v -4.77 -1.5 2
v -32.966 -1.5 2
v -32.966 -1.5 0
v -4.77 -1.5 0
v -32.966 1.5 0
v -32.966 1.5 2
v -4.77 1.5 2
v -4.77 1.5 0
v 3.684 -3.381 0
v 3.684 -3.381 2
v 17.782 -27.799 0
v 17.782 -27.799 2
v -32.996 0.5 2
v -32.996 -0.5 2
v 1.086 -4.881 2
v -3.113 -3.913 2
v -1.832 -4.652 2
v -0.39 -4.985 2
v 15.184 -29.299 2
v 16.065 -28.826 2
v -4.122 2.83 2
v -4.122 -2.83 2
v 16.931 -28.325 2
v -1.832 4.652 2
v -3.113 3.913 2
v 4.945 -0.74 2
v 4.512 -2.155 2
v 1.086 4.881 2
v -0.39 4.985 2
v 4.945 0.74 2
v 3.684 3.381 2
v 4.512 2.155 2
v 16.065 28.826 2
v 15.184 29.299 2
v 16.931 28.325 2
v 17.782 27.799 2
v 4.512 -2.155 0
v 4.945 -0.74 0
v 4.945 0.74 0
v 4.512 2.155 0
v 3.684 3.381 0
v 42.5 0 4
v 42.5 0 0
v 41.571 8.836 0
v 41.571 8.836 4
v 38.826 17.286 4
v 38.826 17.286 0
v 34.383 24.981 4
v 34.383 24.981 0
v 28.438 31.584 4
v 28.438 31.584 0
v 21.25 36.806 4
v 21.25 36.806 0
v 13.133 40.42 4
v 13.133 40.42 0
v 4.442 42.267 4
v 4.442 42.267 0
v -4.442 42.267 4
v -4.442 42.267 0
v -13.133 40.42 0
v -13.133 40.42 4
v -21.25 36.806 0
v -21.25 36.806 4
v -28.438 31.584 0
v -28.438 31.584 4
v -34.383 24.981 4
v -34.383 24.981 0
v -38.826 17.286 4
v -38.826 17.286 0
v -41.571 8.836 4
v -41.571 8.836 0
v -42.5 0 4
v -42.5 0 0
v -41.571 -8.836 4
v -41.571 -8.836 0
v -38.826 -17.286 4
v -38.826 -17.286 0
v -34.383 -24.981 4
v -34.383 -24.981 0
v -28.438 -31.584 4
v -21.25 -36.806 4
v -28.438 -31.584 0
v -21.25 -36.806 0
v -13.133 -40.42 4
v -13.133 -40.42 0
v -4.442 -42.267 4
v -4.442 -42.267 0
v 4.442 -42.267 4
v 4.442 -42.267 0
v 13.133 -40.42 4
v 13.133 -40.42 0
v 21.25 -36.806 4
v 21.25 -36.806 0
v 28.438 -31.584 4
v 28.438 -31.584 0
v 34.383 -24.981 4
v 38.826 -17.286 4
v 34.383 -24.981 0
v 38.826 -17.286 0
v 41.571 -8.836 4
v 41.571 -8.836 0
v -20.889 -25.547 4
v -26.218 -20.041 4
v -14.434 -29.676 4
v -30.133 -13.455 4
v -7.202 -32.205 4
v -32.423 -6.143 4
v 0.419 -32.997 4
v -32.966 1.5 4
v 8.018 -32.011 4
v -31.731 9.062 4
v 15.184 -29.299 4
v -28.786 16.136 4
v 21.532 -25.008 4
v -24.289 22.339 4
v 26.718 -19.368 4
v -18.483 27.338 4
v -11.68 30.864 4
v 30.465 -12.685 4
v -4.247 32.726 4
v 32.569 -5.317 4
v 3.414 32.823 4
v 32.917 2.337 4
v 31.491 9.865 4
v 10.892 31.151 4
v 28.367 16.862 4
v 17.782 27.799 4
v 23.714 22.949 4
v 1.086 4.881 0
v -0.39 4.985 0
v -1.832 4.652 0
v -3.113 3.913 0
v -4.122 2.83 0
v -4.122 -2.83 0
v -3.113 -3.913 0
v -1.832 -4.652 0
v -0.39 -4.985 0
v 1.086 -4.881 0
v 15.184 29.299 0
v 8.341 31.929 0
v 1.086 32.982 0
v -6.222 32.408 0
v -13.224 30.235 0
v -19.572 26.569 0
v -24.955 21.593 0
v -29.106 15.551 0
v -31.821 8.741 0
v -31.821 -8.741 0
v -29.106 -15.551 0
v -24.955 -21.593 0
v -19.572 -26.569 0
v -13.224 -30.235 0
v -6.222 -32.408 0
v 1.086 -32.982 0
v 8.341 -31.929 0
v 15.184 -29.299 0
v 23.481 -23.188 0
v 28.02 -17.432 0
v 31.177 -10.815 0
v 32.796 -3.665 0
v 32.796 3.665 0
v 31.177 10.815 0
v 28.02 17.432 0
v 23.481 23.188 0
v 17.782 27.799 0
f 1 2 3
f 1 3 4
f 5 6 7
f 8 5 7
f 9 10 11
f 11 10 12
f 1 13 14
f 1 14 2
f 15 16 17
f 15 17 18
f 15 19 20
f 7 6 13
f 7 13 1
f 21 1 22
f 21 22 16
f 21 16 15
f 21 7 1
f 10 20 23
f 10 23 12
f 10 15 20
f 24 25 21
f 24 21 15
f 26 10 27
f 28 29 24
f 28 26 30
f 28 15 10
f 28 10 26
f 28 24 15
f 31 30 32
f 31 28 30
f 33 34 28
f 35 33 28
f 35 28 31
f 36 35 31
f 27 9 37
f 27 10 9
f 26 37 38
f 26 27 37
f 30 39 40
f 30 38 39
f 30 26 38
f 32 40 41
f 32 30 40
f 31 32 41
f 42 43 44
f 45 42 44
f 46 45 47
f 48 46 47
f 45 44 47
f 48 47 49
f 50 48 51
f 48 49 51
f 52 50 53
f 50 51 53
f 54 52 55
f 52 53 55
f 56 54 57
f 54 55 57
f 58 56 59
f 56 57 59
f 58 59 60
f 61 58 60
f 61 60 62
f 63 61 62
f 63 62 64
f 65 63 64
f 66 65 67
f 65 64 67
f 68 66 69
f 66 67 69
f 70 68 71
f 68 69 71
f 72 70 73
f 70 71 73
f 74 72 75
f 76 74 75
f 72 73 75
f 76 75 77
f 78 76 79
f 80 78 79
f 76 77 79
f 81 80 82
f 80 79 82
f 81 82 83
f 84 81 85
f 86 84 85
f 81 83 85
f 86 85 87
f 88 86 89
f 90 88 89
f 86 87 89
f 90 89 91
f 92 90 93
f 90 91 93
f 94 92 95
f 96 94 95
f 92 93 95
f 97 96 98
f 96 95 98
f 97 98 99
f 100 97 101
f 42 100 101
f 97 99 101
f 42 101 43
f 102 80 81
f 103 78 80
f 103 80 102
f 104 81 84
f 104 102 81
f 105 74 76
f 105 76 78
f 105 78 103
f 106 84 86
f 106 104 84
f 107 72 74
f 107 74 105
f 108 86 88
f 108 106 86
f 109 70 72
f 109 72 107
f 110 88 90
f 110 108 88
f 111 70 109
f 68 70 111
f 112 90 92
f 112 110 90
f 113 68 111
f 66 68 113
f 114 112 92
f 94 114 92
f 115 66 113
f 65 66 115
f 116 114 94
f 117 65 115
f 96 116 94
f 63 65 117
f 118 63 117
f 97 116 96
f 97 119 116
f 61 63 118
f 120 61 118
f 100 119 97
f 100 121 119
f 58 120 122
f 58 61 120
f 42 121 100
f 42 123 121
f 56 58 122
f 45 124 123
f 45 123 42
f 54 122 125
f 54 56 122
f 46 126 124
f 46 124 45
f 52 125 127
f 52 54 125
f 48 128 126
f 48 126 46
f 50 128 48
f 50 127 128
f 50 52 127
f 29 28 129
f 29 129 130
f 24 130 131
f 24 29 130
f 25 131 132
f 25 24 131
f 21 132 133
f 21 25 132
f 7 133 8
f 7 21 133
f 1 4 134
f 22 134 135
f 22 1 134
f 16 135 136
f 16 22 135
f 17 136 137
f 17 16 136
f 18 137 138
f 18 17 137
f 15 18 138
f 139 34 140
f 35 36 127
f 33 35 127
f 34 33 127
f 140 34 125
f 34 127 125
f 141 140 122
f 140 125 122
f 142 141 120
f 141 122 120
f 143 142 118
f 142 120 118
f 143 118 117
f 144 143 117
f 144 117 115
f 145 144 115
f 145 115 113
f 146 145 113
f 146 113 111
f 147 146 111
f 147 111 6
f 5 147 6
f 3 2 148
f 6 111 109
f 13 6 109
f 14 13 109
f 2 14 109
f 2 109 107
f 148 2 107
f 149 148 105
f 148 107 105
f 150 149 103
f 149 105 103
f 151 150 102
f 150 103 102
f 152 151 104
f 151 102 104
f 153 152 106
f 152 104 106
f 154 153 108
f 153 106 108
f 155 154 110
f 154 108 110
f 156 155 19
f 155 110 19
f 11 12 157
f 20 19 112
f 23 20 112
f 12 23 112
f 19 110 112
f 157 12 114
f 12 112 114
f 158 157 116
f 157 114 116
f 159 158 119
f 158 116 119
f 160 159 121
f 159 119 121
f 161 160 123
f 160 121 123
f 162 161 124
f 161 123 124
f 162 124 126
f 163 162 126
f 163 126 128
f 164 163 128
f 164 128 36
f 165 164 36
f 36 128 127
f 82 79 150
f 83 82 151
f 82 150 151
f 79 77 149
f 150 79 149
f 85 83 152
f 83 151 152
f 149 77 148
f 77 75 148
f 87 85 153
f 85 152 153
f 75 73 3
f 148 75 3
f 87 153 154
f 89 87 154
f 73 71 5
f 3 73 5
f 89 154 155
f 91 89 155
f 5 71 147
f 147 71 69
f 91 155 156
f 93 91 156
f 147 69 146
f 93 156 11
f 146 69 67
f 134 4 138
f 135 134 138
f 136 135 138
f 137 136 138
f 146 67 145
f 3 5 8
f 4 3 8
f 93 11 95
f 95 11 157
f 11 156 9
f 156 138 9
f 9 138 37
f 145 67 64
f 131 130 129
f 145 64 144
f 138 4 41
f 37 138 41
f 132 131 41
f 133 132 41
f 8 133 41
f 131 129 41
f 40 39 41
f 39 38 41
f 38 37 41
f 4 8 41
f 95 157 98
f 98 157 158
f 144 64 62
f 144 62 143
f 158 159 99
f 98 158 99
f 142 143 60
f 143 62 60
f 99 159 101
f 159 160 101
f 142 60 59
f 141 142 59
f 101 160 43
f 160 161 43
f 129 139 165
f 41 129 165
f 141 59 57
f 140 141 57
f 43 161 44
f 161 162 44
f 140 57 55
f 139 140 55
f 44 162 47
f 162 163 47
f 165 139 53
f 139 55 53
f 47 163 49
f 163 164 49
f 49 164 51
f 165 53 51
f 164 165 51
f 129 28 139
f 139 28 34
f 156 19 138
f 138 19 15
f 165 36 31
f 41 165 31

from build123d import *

# Parameters (mm, degrees)
SKETCH1_R           = 42.5
BOSS_EXTRUDE1_DEPTH = 4
SKETCH3_R           = 33
SKETCH3_R_2         = 5
CUT_EXTRUDE2_DEPTH  = 61.237031799
SKETCH4_W           = 35
SKETCH4_H           = 3
BOSS_EXTRUDE3_DEPTH = 4
SKETCH5_R           = 33
CUT_EXTRUDE4_DEPTH  = 2


# Read off the part's stored shape, not the designer's step: Cavity1
with BuildPart() as part:
    # Sketch1 → Boss-Extrude1 (new body)
    with BuildSketch(Plane.XY):
        Circle(SKETCH1_R)
    extrude(amount=BOSS_EXTRUDE1_DEPTH)

    # Cavity1 outline → Cavity1 (revolve, cut)
    with BuildSketch(Plane.XZ):
        Polygon((0.75, 0), (0.75, 3.9), (0.65, 4), (0, 4), (0, 0), align=None)
    revolve(axis=Axis((0, 0, 0), (0, 0, 1)), mode=Mode.SUBTRACT)

    # Sketch3 → Cut-Extrude2 (cut, through all)
    with BuildSketch(Plane.XY.offset(4)):
        Circle(SKETCH3_R)
        Circle(SKETCH3_R_2, mode=Mode.SUBTRACT)
    extrude(amount=-CUT_EXTRUDE2_DEPTH, mode=Mode.SUBTRACT)


with BuildPart() as cut_extrude2_piece_1:
    # of the separate pieces the step leaves, piece 1, a body of its own (cut_extrude2_pieces)
    add(part.part.solids().sort_by_distance((42.5, 0, 0))[0])



with BuildPart() as cut_extrude2_piece_2:
    # of the separate pieces the step leaves, piece 2, a body of its own (cut_extrude2_pieces)
    add(part.part.solids().sort_by_distance((5, 0, 0))[0])


with BuildPart() as cut_extrude2_piece_1_1:
    add(cut_extrude2_piece_1.part)

    add(cut_extrude2_piece_2.part)  # Boss-Extrude3 merges Cut-Extrude2 piece 2
    # Sketch4 → Boss-Extrude3 (add)
    with BuildSketch(Plane.XY.offset(4)):
        with Locations((-17.5, 0)):
            Rectangle(SKETCH4_W, SKETCH4_H)
        Polygon((-1.299038106, 0.75), (16.200961894, 31.060889132), (18.799038106, 29.560889132), (1.299038106, -0.75), align=None)
        Polygon((1.299038106, 0.75), (18.799038106, -29.560889132), (16.200961894, -31.060889132), (-1.299038106, -0.75), align=None)
    extrude(amount=-BOSS_EXTRUDE3_DEPTH)

    # Sketch5 → Cut-Extrude4 (cut)
    with BuildSketch(Plane.XY.offset(4)):
        Circle(SKETCH5_R)
    extrude(amount=-CUT_EXTRUDE4_DEPTH, mode=Mode.SUBTRACT)


solid = cut_extrude2_piece_1_1.part
